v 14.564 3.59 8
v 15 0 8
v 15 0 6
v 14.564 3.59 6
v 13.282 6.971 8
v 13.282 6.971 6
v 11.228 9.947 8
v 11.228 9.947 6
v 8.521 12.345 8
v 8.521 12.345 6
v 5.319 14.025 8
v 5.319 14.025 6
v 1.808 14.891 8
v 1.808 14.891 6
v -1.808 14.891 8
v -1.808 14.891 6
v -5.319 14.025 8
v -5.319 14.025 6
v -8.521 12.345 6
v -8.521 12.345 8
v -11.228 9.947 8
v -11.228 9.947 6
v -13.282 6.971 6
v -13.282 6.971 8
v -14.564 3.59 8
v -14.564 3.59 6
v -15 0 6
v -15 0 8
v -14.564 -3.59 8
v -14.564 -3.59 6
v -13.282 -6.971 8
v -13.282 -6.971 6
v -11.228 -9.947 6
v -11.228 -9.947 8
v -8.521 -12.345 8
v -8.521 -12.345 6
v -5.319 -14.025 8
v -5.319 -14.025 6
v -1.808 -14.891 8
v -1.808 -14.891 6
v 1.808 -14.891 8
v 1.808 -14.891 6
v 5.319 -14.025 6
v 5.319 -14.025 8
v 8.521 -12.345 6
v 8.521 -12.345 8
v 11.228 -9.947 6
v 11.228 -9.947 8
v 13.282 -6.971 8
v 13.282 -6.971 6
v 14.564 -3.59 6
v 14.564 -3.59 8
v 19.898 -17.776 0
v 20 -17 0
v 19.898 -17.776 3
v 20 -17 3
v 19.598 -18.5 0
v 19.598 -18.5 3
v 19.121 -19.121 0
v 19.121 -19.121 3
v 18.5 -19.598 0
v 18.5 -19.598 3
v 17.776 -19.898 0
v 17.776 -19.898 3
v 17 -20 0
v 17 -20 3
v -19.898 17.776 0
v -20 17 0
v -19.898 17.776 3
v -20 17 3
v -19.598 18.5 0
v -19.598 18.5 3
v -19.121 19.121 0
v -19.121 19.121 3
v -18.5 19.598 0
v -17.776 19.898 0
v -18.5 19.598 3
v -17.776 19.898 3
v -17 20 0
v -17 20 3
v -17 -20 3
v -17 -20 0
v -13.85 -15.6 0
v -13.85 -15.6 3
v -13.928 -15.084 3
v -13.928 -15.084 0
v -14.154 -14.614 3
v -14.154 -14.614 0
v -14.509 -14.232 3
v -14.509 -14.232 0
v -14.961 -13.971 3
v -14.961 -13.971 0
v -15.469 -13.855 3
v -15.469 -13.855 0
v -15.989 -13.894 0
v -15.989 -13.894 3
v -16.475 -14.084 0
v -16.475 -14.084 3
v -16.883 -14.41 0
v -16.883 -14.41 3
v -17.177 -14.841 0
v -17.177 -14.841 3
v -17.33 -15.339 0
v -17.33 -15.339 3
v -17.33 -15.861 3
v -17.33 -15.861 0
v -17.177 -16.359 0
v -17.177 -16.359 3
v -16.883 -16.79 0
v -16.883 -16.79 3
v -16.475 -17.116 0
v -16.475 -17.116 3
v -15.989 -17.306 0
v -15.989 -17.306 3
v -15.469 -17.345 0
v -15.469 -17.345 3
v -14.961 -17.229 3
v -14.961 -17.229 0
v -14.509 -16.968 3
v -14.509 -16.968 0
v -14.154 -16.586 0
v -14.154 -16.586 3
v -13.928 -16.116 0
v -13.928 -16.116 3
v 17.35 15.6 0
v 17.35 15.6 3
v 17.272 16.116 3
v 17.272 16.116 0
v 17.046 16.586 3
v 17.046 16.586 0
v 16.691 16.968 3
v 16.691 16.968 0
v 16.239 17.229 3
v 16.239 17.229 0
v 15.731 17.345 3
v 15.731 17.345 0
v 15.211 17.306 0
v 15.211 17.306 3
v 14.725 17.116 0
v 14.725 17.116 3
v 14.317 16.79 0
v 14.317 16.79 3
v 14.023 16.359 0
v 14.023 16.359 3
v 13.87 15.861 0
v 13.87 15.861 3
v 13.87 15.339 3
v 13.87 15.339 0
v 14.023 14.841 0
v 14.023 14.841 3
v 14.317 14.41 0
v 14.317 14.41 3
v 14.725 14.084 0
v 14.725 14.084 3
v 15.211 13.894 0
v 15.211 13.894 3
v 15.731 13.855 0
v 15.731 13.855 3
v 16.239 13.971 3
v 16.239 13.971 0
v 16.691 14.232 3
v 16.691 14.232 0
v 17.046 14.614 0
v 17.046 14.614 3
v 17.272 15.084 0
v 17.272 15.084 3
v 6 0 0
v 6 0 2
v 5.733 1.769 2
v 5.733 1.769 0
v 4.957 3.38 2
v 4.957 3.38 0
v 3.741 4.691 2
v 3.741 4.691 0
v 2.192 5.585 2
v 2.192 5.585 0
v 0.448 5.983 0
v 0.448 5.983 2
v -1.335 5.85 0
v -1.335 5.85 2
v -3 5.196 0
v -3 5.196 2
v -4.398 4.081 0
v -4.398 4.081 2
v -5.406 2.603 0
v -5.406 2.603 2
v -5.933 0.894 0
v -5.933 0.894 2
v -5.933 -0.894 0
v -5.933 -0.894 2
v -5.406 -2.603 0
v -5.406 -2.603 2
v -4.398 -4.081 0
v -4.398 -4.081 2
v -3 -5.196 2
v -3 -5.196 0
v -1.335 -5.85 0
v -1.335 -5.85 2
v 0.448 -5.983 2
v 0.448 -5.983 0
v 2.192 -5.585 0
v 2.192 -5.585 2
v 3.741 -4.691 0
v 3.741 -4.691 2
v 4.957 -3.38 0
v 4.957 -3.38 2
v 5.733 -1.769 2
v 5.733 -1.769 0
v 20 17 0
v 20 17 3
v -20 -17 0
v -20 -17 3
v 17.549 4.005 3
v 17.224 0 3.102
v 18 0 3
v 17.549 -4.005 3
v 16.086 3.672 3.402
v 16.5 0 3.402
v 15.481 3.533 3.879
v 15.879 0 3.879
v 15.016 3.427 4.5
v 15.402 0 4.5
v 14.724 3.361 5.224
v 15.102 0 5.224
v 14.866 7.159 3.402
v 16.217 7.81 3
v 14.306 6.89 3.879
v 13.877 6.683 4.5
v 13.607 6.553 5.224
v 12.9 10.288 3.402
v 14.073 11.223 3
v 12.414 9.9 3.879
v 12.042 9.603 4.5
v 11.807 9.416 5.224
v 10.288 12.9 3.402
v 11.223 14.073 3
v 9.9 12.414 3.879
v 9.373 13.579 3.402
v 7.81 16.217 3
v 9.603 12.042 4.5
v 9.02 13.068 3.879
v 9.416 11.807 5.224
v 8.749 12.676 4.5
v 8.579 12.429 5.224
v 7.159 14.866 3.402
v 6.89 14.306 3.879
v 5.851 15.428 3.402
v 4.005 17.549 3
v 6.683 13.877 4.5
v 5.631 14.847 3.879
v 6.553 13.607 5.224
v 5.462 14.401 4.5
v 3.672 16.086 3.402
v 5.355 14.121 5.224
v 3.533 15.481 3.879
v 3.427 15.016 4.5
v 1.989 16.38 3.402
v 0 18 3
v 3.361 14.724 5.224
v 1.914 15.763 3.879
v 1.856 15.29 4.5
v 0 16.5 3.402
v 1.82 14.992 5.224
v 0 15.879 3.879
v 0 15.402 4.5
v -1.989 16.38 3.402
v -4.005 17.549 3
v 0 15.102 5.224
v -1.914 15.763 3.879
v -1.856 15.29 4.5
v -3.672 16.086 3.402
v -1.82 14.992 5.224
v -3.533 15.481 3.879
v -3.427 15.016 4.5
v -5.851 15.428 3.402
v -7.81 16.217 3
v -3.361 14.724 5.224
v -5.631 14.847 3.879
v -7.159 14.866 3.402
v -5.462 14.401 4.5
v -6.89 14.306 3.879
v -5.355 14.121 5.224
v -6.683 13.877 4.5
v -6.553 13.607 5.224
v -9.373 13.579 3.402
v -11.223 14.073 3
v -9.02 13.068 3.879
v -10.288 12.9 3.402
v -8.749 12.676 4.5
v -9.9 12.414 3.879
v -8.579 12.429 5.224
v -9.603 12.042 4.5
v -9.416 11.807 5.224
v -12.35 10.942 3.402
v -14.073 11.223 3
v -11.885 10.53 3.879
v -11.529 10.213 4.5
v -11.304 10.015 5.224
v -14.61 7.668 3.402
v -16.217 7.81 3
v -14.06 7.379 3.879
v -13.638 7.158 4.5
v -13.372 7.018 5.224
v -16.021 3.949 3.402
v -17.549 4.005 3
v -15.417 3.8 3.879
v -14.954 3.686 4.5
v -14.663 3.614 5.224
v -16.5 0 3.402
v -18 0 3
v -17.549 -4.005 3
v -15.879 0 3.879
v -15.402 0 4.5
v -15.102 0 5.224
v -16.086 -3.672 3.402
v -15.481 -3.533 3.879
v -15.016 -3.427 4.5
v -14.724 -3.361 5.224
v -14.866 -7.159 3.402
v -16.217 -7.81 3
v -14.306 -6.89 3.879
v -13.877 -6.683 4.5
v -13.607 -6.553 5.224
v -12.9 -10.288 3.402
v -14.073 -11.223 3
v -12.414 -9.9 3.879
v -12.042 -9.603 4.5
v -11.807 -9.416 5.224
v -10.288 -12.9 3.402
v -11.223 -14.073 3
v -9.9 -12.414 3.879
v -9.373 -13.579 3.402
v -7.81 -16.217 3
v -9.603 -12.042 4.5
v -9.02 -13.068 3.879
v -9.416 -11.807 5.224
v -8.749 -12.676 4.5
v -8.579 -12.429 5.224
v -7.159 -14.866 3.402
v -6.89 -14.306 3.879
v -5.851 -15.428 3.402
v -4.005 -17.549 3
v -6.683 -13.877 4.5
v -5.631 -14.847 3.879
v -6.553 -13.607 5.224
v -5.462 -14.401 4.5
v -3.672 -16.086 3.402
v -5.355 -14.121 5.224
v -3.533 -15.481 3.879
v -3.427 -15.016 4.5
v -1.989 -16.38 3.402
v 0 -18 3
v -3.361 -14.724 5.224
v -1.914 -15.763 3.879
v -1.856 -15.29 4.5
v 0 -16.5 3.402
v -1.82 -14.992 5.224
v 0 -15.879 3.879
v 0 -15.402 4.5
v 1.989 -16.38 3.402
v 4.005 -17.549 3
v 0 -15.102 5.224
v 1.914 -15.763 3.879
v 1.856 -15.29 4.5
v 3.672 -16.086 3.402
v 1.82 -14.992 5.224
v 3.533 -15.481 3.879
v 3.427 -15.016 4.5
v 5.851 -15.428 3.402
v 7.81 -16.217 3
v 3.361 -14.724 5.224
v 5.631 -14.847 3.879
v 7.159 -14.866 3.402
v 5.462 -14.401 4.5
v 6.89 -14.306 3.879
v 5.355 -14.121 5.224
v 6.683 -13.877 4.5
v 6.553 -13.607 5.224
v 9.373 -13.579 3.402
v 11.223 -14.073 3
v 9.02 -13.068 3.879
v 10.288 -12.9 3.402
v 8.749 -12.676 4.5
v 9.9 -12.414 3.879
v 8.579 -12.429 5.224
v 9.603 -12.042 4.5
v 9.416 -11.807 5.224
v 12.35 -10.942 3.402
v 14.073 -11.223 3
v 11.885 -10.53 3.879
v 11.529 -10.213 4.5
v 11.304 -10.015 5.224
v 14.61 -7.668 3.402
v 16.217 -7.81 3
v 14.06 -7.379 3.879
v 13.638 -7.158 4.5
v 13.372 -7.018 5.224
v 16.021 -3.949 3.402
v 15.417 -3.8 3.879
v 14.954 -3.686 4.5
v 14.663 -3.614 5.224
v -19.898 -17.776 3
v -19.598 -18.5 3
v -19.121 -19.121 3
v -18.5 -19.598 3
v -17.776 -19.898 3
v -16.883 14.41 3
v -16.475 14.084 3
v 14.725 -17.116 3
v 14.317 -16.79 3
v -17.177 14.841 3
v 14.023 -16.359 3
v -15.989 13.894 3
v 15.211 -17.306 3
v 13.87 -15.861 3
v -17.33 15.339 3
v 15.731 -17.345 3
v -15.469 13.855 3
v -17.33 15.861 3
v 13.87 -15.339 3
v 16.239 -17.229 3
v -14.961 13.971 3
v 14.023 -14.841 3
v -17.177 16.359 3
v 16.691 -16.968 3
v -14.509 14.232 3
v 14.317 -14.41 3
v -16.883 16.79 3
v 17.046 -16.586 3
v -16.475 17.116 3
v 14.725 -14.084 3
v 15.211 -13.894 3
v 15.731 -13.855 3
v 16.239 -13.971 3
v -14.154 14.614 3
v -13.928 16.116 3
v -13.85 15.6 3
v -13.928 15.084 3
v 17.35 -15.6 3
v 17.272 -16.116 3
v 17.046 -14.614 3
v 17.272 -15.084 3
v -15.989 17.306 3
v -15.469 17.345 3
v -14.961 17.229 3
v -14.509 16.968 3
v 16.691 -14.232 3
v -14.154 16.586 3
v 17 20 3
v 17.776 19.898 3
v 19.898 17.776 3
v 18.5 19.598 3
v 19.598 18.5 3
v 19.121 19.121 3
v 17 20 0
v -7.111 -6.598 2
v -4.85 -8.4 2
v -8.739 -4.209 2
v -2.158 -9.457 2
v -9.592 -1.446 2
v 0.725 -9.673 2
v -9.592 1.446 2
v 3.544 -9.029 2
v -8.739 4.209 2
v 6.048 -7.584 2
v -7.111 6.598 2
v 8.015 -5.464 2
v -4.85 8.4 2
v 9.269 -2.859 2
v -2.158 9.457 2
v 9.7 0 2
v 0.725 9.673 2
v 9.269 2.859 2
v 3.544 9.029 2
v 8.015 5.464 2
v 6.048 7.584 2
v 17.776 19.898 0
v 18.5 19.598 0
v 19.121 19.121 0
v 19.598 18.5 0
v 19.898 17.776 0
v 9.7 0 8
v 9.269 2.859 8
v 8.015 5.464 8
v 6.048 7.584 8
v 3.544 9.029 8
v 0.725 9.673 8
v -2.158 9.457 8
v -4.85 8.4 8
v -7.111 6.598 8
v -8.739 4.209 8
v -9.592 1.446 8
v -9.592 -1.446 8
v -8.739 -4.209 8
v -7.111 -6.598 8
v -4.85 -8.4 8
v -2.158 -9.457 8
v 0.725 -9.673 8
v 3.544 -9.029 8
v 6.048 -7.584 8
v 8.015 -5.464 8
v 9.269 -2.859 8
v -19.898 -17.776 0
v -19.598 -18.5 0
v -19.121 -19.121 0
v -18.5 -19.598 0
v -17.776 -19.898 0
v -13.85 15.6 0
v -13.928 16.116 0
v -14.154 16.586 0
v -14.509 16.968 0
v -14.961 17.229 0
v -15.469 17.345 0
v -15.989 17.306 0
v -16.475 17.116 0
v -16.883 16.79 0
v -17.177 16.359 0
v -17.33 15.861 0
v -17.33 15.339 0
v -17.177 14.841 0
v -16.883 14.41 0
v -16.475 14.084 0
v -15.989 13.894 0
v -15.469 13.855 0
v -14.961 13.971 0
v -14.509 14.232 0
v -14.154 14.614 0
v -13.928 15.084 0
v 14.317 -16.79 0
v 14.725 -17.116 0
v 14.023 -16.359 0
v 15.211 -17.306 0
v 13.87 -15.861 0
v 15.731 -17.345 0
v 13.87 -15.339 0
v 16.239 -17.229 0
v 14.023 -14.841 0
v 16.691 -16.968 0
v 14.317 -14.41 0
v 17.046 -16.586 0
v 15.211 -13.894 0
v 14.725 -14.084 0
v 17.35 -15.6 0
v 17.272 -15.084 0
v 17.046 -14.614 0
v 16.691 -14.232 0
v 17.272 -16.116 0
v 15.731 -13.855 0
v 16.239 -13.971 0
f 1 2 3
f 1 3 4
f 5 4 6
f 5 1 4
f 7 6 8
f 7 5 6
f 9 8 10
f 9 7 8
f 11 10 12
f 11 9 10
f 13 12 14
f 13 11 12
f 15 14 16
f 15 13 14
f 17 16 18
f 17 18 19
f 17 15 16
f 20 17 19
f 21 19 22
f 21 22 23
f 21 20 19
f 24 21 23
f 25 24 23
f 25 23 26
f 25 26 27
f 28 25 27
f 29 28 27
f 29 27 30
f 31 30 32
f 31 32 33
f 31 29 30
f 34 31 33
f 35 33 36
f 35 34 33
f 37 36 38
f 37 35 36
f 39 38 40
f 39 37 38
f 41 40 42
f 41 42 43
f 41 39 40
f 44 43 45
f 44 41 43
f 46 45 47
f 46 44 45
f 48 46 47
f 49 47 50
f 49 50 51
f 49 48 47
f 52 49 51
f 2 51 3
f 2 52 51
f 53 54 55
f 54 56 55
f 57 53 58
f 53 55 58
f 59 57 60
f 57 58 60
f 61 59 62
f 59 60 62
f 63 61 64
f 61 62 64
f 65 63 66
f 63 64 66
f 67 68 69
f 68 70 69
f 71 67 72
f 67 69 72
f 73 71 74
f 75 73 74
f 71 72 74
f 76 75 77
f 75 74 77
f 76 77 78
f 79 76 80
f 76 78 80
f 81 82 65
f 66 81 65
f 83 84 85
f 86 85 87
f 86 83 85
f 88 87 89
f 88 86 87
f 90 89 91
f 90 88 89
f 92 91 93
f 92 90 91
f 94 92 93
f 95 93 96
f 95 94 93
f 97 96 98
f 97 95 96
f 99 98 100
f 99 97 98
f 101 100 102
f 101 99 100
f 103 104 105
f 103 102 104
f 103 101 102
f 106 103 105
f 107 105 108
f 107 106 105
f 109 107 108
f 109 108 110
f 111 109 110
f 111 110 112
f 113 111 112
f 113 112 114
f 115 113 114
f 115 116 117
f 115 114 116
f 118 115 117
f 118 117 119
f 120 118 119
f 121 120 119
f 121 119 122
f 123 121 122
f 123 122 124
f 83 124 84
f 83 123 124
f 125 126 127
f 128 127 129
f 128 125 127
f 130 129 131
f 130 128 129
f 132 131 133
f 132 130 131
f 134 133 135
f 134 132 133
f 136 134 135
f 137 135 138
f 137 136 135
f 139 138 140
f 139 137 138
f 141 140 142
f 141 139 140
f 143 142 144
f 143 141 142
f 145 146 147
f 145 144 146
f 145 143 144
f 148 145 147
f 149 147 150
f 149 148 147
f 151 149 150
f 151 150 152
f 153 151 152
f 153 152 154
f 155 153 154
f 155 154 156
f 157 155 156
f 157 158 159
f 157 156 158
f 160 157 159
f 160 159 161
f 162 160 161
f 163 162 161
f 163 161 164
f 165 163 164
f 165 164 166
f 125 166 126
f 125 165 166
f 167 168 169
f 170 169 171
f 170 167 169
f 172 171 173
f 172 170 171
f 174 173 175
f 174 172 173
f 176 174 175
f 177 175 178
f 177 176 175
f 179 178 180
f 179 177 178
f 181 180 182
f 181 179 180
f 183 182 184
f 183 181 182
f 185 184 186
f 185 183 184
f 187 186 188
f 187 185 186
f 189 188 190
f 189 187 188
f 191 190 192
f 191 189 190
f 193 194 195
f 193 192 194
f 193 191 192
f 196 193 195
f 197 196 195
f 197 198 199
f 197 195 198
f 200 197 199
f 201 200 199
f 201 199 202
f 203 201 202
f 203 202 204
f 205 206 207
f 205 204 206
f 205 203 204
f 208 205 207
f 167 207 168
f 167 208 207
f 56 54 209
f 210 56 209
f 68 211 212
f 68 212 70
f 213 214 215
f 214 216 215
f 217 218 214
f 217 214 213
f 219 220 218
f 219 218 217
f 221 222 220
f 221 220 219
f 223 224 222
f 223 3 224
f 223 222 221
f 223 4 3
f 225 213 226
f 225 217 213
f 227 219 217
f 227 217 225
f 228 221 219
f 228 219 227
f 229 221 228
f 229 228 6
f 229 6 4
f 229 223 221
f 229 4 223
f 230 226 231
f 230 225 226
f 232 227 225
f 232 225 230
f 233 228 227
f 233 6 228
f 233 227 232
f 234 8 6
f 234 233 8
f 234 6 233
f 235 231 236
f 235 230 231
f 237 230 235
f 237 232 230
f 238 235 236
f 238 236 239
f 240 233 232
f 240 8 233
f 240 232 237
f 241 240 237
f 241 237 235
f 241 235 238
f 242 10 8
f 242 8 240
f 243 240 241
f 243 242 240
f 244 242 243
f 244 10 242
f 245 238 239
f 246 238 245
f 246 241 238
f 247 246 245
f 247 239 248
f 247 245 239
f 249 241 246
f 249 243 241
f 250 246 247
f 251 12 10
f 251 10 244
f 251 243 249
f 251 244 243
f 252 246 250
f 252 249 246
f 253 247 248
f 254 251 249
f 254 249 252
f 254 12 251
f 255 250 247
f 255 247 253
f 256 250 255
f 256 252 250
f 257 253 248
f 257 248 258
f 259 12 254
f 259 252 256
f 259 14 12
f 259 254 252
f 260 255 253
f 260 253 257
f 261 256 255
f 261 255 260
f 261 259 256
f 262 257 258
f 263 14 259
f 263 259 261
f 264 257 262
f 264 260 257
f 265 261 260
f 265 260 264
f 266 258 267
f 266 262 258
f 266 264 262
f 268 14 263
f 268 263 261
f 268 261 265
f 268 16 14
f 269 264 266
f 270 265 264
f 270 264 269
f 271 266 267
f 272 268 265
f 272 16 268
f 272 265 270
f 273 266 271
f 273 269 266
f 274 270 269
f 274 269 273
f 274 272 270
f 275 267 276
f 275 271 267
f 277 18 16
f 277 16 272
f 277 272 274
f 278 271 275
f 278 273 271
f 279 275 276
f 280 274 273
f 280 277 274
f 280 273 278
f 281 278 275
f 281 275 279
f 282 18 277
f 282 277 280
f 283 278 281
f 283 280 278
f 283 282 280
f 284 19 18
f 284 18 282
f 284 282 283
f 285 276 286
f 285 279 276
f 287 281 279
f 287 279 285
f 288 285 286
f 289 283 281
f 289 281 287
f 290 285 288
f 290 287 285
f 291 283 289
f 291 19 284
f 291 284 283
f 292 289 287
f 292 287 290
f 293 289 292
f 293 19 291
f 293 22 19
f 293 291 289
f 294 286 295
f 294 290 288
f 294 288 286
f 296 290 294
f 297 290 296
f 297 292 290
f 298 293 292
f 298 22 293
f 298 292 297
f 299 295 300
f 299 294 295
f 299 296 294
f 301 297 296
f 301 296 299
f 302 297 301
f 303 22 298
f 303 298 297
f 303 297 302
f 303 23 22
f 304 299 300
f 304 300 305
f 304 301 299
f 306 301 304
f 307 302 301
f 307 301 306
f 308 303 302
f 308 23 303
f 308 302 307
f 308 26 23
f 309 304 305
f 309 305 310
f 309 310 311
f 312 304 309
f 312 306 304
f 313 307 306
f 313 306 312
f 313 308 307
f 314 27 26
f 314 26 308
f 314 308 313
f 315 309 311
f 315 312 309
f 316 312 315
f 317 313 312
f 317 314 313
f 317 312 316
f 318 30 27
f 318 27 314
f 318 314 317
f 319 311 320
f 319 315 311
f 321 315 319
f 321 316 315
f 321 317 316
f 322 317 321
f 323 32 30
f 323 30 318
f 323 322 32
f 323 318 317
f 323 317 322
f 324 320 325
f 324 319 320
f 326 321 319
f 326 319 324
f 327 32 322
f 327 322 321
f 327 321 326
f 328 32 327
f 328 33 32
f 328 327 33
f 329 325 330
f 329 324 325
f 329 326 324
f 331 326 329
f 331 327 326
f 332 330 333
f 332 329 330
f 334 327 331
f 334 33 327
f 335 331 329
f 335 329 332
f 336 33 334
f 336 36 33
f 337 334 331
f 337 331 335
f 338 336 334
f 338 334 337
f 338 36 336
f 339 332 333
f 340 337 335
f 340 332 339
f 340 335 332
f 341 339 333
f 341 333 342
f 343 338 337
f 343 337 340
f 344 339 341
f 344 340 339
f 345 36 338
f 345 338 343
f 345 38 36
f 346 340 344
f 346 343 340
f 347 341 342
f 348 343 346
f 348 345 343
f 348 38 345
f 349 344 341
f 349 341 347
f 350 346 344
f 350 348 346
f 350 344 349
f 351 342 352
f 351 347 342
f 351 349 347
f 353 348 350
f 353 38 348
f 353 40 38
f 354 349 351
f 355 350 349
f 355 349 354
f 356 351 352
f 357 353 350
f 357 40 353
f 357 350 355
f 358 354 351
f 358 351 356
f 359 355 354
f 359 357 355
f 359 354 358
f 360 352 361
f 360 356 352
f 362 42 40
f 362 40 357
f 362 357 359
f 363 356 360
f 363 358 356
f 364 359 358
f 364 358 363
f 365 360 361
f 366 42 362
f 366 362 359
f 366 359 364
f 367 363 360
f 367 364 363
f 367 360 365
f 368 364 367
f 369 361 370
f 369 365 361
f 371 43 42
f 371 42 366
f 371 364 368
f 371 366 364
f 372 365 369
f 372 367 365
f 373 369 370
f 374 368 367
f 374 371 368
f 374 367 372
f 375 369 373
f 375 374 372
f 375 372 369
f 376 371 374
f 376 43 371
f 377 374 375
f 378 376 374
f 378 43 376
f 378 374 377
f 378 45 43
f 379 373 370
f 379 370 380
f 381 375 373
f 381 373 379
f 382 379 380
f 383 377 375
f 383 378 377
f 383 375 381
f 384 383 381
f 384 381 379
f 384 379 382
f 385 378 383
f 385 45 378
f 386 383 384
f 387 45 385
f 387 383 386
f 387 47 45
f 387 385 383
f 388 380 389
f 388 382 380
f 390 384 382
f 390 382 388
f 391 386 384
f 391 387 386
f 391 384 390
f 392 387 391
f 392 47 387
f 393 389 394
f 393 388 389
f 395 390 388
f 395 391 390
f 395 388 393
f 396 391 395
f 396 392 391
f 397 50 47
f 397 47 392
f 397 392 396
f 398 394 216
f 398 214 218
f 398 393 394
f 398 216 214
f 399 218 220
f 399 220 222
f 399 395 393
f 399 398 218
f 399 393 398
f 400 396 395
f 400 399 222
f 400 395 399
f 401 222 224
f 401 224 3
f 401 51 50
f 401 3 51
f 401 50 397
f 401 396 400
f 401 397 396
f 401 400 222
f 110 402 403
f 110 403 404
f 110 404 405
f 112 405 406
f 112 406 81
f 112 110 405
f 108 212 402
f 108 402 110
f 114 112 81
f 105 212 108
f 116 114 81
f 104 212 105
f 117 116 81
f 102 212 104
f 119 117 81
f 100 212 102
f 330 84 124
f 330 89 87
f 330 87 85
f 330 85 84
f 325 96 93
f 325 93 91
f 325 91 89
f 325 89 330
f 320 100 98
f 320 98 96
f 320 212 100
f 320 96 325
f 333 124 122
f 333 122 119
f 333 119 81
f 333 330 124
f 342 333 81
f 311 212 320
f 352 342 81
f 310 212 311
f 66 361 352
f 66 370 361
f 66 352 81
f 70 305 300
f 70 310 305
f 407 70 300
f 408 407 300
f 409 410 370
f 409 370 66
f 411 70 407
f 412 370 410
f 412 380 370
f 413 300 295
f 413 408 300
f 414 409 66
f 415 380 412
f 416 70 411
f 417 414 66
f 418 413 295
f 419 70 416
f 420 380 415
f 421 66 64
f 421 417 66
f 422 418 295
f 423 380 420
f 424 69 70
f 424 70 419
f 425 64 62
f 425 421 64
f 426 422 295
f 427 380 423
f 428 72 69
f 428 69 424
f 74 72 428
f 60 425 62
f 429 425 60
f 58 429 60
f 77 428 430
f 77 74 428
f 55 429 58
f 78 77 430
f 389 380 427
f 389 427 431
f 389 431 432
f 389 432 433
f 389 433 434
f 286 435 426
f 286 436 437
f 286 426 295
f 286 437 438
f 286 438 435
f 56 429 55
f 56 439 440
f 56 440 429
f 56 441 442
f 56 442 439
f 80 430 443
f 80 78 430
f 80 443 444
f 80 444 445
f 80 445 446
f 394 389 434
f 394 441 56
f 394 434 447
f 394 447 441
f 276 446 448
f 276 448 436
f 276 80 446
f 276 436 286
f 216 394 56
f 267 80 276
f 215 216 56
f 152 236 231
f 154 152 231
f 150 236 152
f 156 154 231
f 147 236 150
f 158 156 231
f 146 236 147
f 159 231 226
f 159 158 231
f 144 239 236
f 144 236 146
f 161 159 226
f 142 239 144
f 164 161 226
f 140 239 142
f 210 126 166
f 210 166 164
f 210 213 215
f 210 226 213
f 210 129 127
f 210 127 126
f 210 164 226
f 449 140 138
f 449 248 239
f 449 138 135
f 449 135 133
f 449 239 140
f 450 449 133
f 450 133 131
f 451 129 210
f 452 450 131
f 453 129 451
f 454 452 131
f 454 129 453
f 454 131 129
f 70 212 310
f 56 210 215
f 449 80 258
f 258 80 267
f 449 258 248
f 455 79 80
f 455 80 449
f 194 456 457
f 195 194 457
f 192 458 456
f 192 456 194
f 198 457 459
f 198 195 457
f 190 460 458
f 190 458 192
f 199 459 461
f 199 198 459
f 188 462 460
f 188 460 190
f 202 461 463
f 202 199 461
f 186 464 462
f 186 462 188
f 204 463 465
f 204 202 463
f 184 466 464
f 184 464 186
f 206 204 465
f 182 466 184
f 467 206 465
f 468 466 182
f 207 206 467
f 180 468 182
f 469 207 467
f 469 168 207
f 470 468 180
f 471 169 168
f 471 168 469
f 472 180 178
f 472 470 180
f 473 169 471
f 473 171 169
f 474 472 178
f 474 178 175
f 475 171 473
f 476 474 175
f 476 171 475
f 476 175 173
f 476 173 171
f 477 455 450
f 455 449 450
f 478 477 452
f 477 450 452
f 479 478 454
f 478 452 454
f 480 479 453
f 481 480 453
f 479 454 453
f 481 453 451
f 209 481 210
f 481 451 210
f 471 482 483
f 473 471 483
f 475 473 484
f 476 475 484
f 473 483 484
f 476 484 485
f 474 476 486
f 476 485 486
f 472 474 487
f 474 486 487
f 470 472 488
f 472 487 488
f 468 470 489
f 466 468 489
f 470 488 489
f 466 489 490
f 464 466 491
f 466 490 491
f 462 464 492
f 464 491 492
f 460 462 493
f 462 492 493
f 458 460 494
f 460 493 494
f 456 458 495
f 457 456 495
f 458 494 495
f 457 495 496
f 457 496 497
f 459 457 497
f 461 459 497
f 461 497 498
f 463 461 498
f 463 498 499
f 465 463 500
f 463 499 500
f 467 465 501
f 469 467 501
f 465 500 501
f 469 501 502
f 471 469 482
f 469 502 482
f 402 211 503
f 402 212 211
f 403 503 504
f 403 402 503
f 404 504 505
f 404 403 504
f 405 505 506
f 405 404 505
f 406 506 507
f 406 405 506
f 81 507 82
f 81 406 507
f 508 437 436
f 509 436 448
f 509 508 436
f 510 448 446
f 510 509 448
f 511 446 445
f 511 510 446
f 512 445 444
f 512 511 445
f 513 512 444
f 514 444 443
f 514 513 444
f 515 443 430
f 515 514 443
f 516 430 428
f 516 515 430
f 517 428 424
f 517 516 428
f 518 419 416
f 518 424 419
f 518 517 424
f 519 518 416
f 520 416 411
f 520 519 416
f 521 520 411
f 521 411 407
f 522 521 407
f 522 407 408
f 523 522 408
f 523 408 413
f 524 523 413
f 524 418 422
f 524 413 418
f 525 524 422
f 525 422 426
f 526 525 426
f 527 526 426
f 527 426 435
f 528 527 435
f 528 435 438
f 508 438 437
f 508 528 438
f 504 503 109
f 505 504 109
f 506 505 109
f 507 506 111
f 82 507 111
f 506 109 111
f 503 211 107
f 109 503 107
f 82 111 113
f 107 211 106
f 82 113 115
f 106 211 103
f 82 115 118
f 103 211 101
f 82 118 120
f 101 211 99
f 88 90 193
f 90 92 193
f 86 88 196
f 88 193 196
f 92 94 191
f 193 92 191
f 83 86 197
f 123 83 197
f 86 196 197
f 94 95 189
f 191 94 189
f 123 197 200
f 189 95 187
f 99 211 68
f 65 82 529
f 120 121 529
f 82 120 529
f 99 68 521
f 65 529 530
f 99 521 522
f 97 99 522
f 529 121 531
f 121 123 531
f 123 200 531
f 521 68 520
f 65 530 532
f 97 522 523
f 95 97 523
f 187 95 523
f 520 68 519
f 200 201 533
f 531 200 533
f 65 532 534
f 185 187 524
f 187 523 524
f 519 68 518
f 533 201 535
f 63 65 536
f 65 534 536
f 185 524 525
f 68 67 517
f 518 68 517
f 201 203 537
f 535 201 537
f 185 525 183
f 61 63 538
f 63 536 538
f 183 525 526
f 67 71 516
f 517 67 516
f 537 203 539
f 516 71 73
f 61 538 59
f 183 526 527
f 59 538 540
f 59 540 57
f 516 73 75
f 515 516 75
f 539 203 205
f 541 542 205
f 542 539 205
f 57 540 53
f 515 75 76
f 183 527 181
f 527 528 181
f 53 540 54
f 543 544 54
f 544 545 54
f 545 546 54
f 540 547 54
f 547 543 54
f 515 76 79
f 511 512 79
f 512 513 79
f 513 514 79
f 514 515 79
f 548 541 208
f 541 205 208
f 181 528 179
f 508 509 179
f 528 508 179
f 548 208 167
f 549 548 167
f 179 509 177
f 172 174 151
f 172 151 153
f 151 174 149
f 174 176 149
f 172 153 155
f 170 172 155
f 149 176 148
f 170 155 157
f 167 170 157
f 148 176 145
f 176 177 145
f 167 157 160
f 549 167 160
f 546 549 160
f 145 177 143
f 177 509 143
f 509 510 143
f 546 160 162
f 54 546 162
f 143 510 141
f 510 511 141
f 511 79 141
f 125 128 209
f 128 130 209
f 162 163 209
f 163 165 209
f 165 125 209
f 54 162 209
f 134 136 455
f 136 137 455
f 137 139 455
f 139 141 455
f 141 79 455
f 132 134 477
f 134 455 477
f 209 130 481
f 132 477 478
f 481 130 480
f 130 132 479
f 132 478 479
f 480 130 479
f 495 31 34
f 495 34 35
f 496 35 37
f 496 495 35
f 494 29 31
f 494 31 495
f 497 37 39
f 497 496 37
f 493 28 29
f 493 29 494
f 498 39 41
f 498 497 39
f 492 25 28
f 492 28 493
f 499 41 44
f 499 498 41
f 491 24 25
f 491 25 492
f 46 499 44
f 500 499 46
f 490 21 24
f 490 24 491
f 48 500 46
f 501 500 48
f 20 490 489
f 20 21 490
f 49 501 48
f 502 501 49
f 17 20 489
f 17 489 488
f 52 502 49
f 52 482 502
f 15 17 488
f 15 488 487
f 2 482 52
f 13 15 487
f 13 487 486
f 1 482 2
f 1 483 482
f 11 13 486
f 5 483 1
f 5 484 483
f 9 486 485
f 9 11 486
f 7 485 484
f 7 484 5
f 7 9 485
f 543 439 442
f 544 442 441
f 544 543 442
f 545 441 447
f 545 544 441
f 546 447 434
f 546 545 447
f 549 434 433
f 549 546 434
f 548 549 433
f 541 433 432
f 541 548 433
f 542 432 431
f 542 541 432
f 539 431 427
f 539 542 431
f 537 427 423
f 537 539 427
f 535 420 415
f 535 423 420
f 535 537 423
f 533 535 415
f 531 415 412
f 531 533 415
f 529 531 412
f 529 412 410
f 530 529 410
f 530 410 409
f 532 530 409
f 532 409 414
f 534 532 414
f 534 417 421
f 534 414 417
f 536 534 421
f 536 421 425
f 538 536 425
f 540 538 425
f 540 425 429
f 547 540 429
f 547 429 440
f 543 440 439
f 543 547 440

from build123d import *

# Parameters (mm, degrees)
SKETCH_W        = 40
SKETCH_H        = 40
SKETCH_R        = 6
SKETCH_R_2      = 1.75
PAD_DEPTH       = 8
SKETCH001_R     = 9.7
POCKET_DEPTH    = 6
SKETCH002_W     = 42
SKETCH002_H     = 42
SKETCH002_R     = 15
POCKET001_DEPTH = 5
FILLET_R        = 3
FILLET001_R     = 3


with BuildPart() as part:
    # Sketch → Pad (new body)
    with BuildSketch(Plane.XY):
        Rectangle(SKETCH_W, SKETCH_H)
        Circle(SKETCH_R, mode=Mode.SUBTRACT)
        with Locations((15.6, 15.6)):
            Circle(SKETCH_R_2, mode=Mode.SUBTRACT)
        with Locations((15.6, -15.6)):
            Circle(SKETCH_R_2, mode=Mode.SUBTRACT)
        with Locations((-15.6, -15.6)):
            Circle(SKETCH_R_2, mode=Mode.SUBTRACT)
        with Locations((-15.6, 15.6)):
            Circle(SKETCH_R_2, mode=Mode.SUBTRACT)
    extrude(amount=PAD_DEPTH)

    # Sketch001 → Pocket (cut)
    with BuildSketch(Plane.XY.offset(8)):
        Circle(SKETCH001_R)
    extrude(amount=-POCKET_DEPTH, mode=Mode.SUBTRACT)

    # Sketch002 → Pocket001 (cut)
    with BuildSketch(Plane.XY.offset(8)):
        Rectangle(SKETCH002_W, SKETCH002_H)
        Circle(SKETCH002_R, mode=Mode.SUBTRACT)
    extrude(amount=-POCKET001_DEPTH, mode=Mode.SUBTRACT)

    # Fillet
    fillet_edges = [part.edges().sort_by_distance(p)[0] for p in [
        (-15, 0, 3),
    ]]
    fillet(fillet_edges, radius=FILLET_R)

    # Fillet001
    fillet001_edges = [part.edges().sort_by_distance(p)[0] for p in [
        (-20, 20, 1.5),
        (20, 20, 1.5),
        (20, -20, 1.5),
        (-20, -20, 1.5),
    ]]
    fillet(fillet001_edges, radius=FILLET001_R)


solid = part.part
